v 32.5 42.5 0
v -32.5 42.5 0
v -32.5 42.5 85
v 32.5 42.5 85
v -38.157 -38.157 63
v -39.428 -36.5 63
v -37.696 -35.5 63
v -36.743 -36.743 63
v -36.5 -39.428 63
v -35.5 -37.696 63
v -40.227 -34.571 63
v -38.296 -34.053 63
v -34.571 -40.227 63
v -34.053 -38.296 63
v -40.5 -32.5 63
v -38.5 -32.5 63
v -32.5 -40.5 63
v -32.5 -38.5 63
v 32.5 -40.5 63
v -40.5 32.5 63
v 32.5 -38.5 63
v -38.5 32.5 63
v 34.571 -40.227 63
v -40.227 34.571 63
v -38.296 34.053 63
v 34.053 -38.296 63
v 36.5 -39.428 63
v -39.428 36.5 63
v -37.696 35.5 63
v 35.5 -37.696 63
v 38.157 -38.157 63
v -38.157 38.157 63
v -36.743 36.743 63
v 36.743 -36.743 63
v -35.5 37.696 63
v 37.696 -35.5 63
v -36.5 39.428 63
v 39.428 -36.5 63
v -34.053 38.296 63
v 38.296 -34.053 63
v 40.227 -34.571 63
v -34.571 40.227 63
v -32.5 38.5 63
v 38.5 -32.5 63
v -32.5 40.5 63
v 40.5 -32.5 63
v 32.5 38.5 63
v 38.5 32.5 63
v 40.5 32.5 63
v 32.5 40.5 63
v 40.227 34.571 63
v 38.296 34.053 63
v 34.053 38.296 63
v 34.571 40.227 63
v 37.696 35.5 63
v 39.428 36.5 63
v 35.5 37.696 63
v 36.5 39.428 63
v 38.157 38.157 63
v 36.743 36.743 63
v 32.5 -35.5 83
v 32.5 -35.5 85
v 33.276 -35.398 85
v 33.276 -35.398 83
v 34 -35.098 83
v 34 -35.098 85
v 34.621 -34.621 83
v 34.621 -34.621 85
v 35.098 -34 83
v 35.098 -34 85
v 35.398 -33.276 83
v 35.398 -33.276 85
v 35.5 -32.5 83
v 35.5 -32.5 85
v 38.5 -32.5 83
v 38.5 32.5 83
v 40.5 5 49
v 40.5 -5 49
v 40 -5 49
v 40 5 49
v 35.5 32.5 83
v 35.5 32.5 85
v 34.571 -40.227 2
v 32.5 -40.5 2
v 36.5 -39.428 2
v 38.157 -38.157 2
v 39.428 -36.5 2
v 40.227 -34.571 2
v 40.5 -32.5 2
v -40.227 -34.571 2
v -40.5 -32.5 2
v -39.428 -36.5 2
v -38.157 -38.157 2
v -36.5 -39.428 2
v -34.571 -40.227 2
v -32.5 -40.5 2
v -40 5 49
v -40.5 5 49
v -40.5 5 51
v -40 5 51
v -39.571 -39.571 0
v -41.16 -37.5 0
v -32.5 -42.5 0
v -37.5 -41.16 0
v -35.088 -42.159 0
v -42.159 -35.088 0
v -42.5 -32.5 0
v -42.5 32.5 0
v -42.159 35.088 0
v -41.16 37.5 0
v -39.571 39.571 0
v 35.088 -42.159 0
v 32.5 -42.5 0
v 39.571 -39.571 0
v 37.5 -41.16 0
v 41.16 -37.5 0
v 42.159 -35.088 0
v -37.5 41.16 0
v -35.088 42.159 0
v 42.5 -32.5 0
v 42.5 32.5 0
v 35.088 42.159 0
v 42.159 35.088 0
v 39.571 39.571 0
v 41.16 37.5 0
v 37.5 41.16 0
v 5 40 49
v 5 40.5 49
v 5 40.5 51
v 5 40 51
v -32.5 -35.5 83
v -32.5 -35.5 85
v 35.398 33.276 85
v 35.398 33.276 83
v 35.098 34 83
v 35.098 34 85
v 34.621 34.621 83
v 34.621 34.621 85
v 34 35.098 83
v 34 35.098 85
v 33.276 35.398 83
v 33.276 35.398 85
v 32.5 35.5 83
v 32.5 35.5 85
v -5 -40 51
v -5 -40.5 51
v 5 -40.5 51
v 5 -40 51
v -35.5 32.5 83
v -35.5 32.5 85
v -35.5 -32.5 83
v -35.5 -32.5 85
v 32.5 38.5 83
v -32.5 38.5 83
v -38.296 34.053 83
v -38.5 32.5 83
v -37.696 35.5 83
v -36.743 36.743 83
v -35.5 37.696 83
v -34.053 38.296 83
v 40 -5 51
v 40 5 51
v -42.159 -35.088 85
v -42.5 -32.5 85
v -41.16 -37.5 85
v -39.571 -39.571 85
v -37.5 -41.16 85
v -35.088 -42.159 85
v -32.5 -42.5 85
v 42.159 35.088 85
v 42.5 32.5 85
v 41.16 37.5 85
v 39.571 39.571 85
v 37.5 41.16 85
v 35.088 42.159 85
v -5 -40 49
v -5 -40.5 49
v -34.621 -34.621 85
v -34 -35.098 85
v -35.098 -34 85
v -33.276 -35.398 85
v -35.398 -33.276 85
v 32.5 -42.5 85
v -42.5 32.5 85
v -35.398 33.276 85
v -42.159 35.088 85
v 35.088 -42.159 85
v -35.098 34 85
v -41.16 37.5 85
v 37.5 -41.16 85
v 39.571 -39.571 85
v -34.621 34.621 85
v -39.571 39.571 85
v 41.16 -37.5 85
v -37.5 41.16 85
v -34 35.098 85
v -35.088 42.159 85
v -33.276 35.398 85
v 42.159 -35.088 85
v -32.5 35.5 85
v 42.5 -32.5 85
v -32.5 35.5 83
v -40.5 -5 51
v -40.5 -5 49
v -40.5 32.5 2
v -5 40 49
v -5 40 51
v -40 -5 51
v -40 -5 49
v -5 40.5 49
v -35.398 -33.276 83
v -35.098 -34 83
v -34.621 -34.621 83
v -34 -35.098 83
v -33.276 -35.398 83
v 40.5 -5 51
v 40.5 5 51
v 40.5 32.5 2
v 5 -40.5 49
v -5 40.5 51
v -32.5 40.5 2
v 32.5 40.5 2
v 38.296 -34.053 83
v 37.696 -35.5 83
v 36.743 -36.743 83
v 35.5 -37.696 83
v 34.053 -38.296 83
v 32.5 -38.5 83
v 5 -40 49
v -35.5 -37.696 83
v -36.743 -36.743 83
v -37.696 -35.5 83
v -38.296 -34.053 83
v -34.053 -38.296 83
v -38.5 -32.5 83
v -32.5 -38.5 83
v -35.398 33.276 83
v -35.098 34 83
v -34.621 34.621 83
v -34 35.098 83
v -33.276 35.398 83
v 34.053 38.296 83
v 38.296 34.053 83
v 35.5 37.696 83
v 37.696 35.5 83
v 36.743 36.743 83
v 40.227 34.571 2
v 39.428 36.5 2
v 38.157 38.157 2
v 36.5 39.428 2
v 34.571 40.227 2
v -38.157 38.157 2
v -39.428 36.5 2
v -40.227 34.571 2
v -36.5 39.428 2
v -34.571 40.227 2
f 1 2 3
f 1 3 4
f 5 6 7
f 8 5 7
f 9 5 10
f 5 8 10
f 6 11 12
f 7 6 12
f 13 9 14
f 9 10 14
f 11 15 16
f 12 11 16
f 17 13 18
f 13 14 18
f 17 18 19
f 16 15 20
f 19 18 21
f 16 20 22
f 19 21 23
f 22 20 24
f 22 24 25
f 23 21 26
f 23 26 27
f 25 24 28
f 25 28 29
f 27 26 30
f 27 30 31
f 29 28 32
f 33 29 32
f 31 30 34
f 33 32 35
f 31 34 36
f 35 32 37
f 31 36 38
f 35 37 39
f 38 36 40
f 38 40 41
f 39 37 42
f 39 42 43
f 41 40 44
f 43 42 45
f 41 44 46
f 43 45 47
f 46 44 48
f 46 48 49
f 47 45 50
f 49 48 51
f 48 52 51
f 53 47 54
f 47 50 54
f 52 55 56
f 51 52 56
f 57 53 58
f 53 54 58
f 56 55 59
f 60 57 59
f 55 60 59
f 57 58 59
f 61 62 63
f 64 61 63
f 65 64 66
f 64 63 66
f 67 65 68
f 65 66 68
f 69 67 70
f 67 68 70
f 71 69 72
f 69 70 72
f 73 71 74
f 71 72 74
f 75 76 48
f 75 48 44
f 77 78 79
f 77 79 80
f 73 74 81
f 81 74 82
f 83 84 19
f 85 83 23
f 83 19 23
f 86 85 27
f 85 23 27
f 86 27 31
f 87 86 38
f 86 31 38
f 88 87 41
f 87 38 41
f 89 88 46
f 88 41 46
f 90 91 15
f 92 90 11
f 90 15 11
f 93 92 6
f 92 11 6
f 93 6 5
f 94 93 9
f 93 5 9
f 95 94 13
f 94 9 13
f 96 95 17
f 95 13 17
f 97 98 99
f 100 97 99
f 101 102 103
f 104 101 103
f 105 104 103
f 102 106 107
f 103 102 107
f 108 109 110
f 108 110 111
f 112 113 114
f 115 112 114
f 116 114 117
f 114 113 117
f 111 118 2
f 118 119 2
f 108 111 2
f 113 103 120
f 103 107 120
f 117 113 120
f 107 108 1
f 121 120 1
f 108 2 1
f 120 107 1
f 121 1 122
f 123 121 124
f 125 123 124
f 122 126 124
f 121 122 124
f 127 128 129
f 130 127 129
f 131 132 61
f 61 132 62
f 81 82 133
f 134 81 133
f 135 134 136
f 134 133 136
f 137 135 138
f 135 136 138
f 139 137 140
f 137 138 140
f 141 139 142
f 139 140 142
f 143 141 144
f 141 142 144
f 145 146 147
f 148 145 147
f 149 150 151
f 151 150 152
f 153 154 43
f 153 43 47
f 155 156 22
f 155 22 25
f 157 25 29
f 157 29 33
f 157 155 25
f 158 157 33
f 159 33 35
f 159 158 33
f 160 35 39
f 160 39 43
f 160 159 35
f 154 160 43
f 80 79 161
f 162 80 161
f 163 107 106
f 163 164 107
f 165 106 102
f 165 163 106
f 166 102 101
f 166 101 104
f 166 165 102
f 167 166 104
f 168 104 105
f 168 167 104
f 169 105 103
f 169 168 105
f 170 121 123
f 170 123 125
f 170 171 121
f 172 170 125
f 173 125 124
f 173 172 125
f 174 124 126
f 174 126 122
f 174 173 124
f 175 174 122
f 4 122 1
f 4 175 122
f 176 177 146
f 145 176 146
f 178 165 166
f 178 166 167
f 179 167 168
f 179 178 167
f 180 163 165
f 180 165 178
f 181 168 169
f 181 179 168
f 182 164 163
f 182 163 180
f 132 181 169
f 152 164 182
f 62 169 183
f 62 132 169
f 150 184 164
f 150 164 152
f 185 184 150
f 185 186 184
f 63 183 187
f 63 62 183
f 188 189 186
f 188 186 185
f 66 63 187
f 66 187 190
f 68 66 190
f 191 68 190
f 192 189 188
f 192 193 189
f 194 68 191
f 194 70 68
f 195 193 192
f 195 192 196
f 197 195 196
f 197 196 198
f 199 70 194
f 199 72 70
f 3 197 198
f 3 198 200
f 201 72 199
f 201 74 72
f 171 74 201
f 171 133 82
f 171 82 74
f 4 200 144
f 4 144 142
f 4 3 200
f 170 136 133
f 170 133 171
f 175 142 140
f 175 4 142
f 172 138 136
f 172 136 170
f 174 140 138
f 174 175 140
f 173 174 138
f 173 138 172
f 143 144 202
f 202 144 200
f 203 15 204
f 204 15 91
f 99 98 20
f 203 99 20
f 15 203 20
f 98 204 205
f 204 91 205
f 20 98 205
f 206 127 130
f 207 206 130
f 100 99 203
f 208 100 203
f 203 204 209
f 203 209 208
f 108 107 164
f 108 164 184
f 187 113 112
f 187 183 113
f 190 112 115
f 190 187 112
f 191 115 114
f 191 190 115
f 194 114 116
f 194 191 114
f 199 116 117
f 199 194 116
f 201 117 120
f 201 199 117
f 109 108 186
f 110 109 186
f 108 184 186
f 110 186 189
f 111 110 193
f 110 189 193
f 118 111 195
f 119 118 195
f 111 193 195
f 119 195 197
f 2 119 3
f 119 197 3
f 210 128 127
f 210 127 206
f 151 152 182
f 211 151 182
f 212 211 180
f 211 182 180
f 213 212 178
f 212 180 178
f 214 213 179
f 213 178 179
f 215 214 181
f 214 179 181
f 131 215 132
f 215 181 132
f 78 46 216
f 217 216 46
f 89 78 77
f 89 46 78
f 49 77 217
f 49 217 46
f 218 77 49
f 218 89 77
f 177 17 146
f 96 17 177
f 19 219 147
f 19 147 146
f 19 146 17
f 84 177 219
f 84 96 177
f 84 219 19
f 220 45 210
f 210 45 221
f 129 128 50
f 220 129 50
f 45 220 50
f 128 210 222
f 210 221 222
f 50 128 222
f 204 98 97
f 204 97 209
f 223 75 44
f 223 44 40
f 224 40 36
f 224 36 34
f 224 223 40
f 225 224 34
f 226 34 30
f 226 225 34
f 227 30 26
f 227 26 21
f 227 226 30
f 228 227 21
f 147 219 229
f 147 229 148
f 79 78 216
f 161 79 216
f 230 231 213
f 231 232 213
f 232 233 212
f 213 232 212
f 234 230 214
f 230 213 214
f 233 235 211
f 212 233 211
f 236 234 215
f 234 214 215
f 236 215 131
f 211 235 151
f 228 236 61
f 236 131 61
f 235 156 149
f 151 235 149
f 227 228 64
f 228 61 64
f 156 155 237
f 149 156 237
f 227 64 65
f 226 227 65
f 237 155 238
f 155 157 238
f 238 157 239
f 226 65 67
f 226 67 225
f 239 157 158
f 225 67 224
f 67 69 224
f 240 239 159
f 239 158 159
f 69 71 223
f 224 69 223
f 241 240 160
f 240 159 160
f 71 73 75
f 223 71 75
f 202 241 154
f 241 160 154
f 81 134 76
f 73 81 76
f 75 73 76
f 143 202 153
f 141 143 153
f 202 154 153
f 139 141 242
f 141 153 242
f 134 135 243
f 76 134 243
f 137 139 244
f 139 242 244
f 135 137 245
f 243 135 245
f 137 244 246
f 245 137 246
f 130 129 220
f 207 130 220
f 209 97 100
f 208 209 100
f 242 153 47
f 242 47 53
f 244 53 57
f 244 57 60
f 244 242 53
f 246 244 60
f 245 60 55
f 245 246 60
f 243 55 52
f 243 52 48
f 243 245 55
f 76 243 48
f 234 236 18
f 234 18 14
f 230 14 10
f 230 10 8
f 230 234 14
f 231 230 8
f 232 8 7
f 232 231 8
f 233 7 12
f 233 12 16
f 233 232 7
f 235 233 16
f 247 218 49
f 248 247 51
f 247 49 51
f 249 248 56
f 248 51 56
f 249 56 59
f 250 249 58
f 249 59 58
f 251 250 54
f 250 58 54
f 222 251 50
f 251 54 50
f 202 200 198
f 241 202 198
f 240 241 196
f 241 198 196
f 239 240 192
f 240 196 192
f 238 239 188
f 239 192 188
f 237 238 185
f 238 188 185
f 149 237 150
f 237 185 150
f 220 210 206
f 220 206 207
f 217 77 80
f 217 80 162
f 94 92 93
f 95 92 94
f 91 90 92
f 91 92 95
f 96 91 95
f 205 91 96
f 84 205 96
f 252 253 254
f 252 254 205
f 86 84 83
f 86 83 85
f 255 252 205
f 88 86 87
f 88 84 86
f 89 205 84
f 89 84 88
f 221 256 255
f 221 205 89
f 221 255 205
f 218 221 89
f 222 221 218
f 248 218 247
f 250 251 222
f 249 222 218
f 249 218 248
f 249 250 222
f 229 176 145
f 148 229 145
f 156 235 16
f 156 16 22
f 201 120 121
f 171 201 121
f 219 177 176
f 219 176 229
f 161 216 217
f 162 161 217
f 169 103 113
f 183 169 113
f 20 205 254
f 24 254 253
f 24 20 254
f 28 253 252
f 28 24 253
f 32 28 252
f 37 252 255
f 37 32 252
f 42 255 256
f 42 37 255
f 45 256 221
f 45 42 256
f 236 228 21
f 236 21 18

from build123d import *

# Parameters (mm, degrees)
SKETCH1_W           = 85
SKETCH1_H           = 85
BOSS_EXTRUDE1_DEPTH = 85
FILLET1_R           = 10
SHELL1_T            = 2
CUT_EXTRUDE1_REACH  = 106.103
BOSS_EXTRUDE2_DEPTH = 20
SKETCH4_W           = 2
SKETCH4_H           = 10
BOSS_EXTRUDE3_DEPTH = 0.5
CIRPATTERN1_COUNT   = 4


with BuildPart() as part:
    # Sketch1 → Boss-Extrude1 (new body)
    with BuildSketch(Plane.XY):
        Rectangle(SKETCH1_W, SKETCH1_H)
    extrude(amount=BOSS_EXTRUDE1_DEPTH)

    # Fillet1
    fillet1_edges = [part.edges().sort_by_distance(p)[0] for p in [
        (-42.5, 42.5, 42.5),
        (-42.5, -42.5, 42.5),
        (42.5, -42.5, 42.5),
        (42.5, 42.5, 42.5),
    ]]
    fillet(fillet1_edges, radius=FILLET1_R)

    # Shell1 (no face opened: a closed hollow body)
    add(offset(amount=-SHELL1_T, mode=Mode.PRIVATE), mode=Mode.SUBTRACT)

    # Sketch2 → Cut-Extrude1 (cut, up to next)
    with BuildSketch(Plane.XY.offset(85), mode=Mode.PRIVATE) as cut_extrude1_sk1:
        with BuildLine():
            Line((32.5, 35.5), (-32.5, 35.5))
            ThreePointArc((-32.5, 35.5), (-34.621320344, 34.621320344), (-35.5, 32.5))
            Line((-35.5, 32.5), (-35.5, -32.5))
            ThreePointArc((-35.5, -32.5), (-34.621320344, -34.621320344), (-32.5, -35.5))
            Line((-32.5, -35.5), (32.5, -35.5))
            ThreePointArc((32.5, -35.5), (34.621320344, -34.621320344), (35.5, -32.5))
            Line((35.5, -32.5), (35.5, 32.5))
            ThreePointArc((35.5, 32.5), (34.621320344, 34.621320344), (32.5, 35.5))
        make_face()
    cut_extrude1_tool1 = extrude(cut_extrude1_sk1.sketch, amount=-CUT_EXTRUDE1_REACH, mode=Mode.PRIVATE) & part.part
    add(cut_extrude1_tool1.solids().sort_by_distance((0, 0, 85))[0], mode=Mode.SUBTRACT)

    # Sketch3 → Boss-Extrude2 (add)
    with BuildSketch(Plane(origin=(0, 0, 83), x_dir=(-1, 0, 0), z_dir=(0, 0, -1))):
        with BuildLine():
            Line((-32.5, 40.5), (32.5, 40.5))
            ThreePointArc((32.5, 40.5), (38.156854249, 38.156854249), (40.5, 32.5))
            Line((40.5, 32.5), (40.5, -32.5))
            ThreePointArc((40.5, -32.5), (38.156854249, -38.156854249), (32.5, -40.5))
            Line((32.5, -40.5), (-32.5, -40.5))
            ThreePointArc((-32.5, -40.5), (-38.156854249, -38.156854249), (-40.5, -32.5))
            Line((-40.5, -32.5), (-40.5, 32.5))
            ThreePointArc((-40.5, 32.5), (-38.156854249, 38.156854249), (-32.5, 40.5))
        make_face()
        with BuildLine():
            Line((38.5, -32.5), (38.5, 32.5))
            ThreePointArc((38.5, 32.5), (36.742640687, 36.742640687), (32.5, 38.5))
            Line((32.5, 38.5), (-32.5, 38.5))
            ThreePointArc((-32.5, 38.5), (-36.742640687, 36.742640687), (-38.5, 32.5))
            Line((-38.5, 32.5), (-38.5, -32.5))
            ThreePointArc((-38.5, -32.5), (-36.742640687, -36.742640687), (-32.5, -38.5))
            Line((-32.5, -38.5), (32.5, -38.5))
            ThreePointArc((32.5, -38.5), (36.742640687, -36.742640687), (38.5, -32.5))
        make_face(mode=Mode.SUBTRACT)
    extrude(amount=BOSS_EXTRUDE2_DEPTH)

    # Sketch4 → Boss-Extrude3 (add)
    with BuildSketch(Plane.ZY.offset(-40.5)):
        with Locations((50, 0)):
            Rectangle(SKETCH4_W, SKETCH4_H)
    boss_extrude3 = extrude(amount=BOSS_EXTRUDE3_DEPTH)

    # CirPattern1: Boss-Extrude3 ×4 about axis
    cirpattern1_axis = Axis((0, 0, -4.25), (0, 0, 1))
    for i in range(1, CIRPATTERN1_COUNT):
        add(boss_extrude3.rotate(cirpattern1_axis, i * 360 / CIRPATTERN1_COUNT))


solid = part.part
